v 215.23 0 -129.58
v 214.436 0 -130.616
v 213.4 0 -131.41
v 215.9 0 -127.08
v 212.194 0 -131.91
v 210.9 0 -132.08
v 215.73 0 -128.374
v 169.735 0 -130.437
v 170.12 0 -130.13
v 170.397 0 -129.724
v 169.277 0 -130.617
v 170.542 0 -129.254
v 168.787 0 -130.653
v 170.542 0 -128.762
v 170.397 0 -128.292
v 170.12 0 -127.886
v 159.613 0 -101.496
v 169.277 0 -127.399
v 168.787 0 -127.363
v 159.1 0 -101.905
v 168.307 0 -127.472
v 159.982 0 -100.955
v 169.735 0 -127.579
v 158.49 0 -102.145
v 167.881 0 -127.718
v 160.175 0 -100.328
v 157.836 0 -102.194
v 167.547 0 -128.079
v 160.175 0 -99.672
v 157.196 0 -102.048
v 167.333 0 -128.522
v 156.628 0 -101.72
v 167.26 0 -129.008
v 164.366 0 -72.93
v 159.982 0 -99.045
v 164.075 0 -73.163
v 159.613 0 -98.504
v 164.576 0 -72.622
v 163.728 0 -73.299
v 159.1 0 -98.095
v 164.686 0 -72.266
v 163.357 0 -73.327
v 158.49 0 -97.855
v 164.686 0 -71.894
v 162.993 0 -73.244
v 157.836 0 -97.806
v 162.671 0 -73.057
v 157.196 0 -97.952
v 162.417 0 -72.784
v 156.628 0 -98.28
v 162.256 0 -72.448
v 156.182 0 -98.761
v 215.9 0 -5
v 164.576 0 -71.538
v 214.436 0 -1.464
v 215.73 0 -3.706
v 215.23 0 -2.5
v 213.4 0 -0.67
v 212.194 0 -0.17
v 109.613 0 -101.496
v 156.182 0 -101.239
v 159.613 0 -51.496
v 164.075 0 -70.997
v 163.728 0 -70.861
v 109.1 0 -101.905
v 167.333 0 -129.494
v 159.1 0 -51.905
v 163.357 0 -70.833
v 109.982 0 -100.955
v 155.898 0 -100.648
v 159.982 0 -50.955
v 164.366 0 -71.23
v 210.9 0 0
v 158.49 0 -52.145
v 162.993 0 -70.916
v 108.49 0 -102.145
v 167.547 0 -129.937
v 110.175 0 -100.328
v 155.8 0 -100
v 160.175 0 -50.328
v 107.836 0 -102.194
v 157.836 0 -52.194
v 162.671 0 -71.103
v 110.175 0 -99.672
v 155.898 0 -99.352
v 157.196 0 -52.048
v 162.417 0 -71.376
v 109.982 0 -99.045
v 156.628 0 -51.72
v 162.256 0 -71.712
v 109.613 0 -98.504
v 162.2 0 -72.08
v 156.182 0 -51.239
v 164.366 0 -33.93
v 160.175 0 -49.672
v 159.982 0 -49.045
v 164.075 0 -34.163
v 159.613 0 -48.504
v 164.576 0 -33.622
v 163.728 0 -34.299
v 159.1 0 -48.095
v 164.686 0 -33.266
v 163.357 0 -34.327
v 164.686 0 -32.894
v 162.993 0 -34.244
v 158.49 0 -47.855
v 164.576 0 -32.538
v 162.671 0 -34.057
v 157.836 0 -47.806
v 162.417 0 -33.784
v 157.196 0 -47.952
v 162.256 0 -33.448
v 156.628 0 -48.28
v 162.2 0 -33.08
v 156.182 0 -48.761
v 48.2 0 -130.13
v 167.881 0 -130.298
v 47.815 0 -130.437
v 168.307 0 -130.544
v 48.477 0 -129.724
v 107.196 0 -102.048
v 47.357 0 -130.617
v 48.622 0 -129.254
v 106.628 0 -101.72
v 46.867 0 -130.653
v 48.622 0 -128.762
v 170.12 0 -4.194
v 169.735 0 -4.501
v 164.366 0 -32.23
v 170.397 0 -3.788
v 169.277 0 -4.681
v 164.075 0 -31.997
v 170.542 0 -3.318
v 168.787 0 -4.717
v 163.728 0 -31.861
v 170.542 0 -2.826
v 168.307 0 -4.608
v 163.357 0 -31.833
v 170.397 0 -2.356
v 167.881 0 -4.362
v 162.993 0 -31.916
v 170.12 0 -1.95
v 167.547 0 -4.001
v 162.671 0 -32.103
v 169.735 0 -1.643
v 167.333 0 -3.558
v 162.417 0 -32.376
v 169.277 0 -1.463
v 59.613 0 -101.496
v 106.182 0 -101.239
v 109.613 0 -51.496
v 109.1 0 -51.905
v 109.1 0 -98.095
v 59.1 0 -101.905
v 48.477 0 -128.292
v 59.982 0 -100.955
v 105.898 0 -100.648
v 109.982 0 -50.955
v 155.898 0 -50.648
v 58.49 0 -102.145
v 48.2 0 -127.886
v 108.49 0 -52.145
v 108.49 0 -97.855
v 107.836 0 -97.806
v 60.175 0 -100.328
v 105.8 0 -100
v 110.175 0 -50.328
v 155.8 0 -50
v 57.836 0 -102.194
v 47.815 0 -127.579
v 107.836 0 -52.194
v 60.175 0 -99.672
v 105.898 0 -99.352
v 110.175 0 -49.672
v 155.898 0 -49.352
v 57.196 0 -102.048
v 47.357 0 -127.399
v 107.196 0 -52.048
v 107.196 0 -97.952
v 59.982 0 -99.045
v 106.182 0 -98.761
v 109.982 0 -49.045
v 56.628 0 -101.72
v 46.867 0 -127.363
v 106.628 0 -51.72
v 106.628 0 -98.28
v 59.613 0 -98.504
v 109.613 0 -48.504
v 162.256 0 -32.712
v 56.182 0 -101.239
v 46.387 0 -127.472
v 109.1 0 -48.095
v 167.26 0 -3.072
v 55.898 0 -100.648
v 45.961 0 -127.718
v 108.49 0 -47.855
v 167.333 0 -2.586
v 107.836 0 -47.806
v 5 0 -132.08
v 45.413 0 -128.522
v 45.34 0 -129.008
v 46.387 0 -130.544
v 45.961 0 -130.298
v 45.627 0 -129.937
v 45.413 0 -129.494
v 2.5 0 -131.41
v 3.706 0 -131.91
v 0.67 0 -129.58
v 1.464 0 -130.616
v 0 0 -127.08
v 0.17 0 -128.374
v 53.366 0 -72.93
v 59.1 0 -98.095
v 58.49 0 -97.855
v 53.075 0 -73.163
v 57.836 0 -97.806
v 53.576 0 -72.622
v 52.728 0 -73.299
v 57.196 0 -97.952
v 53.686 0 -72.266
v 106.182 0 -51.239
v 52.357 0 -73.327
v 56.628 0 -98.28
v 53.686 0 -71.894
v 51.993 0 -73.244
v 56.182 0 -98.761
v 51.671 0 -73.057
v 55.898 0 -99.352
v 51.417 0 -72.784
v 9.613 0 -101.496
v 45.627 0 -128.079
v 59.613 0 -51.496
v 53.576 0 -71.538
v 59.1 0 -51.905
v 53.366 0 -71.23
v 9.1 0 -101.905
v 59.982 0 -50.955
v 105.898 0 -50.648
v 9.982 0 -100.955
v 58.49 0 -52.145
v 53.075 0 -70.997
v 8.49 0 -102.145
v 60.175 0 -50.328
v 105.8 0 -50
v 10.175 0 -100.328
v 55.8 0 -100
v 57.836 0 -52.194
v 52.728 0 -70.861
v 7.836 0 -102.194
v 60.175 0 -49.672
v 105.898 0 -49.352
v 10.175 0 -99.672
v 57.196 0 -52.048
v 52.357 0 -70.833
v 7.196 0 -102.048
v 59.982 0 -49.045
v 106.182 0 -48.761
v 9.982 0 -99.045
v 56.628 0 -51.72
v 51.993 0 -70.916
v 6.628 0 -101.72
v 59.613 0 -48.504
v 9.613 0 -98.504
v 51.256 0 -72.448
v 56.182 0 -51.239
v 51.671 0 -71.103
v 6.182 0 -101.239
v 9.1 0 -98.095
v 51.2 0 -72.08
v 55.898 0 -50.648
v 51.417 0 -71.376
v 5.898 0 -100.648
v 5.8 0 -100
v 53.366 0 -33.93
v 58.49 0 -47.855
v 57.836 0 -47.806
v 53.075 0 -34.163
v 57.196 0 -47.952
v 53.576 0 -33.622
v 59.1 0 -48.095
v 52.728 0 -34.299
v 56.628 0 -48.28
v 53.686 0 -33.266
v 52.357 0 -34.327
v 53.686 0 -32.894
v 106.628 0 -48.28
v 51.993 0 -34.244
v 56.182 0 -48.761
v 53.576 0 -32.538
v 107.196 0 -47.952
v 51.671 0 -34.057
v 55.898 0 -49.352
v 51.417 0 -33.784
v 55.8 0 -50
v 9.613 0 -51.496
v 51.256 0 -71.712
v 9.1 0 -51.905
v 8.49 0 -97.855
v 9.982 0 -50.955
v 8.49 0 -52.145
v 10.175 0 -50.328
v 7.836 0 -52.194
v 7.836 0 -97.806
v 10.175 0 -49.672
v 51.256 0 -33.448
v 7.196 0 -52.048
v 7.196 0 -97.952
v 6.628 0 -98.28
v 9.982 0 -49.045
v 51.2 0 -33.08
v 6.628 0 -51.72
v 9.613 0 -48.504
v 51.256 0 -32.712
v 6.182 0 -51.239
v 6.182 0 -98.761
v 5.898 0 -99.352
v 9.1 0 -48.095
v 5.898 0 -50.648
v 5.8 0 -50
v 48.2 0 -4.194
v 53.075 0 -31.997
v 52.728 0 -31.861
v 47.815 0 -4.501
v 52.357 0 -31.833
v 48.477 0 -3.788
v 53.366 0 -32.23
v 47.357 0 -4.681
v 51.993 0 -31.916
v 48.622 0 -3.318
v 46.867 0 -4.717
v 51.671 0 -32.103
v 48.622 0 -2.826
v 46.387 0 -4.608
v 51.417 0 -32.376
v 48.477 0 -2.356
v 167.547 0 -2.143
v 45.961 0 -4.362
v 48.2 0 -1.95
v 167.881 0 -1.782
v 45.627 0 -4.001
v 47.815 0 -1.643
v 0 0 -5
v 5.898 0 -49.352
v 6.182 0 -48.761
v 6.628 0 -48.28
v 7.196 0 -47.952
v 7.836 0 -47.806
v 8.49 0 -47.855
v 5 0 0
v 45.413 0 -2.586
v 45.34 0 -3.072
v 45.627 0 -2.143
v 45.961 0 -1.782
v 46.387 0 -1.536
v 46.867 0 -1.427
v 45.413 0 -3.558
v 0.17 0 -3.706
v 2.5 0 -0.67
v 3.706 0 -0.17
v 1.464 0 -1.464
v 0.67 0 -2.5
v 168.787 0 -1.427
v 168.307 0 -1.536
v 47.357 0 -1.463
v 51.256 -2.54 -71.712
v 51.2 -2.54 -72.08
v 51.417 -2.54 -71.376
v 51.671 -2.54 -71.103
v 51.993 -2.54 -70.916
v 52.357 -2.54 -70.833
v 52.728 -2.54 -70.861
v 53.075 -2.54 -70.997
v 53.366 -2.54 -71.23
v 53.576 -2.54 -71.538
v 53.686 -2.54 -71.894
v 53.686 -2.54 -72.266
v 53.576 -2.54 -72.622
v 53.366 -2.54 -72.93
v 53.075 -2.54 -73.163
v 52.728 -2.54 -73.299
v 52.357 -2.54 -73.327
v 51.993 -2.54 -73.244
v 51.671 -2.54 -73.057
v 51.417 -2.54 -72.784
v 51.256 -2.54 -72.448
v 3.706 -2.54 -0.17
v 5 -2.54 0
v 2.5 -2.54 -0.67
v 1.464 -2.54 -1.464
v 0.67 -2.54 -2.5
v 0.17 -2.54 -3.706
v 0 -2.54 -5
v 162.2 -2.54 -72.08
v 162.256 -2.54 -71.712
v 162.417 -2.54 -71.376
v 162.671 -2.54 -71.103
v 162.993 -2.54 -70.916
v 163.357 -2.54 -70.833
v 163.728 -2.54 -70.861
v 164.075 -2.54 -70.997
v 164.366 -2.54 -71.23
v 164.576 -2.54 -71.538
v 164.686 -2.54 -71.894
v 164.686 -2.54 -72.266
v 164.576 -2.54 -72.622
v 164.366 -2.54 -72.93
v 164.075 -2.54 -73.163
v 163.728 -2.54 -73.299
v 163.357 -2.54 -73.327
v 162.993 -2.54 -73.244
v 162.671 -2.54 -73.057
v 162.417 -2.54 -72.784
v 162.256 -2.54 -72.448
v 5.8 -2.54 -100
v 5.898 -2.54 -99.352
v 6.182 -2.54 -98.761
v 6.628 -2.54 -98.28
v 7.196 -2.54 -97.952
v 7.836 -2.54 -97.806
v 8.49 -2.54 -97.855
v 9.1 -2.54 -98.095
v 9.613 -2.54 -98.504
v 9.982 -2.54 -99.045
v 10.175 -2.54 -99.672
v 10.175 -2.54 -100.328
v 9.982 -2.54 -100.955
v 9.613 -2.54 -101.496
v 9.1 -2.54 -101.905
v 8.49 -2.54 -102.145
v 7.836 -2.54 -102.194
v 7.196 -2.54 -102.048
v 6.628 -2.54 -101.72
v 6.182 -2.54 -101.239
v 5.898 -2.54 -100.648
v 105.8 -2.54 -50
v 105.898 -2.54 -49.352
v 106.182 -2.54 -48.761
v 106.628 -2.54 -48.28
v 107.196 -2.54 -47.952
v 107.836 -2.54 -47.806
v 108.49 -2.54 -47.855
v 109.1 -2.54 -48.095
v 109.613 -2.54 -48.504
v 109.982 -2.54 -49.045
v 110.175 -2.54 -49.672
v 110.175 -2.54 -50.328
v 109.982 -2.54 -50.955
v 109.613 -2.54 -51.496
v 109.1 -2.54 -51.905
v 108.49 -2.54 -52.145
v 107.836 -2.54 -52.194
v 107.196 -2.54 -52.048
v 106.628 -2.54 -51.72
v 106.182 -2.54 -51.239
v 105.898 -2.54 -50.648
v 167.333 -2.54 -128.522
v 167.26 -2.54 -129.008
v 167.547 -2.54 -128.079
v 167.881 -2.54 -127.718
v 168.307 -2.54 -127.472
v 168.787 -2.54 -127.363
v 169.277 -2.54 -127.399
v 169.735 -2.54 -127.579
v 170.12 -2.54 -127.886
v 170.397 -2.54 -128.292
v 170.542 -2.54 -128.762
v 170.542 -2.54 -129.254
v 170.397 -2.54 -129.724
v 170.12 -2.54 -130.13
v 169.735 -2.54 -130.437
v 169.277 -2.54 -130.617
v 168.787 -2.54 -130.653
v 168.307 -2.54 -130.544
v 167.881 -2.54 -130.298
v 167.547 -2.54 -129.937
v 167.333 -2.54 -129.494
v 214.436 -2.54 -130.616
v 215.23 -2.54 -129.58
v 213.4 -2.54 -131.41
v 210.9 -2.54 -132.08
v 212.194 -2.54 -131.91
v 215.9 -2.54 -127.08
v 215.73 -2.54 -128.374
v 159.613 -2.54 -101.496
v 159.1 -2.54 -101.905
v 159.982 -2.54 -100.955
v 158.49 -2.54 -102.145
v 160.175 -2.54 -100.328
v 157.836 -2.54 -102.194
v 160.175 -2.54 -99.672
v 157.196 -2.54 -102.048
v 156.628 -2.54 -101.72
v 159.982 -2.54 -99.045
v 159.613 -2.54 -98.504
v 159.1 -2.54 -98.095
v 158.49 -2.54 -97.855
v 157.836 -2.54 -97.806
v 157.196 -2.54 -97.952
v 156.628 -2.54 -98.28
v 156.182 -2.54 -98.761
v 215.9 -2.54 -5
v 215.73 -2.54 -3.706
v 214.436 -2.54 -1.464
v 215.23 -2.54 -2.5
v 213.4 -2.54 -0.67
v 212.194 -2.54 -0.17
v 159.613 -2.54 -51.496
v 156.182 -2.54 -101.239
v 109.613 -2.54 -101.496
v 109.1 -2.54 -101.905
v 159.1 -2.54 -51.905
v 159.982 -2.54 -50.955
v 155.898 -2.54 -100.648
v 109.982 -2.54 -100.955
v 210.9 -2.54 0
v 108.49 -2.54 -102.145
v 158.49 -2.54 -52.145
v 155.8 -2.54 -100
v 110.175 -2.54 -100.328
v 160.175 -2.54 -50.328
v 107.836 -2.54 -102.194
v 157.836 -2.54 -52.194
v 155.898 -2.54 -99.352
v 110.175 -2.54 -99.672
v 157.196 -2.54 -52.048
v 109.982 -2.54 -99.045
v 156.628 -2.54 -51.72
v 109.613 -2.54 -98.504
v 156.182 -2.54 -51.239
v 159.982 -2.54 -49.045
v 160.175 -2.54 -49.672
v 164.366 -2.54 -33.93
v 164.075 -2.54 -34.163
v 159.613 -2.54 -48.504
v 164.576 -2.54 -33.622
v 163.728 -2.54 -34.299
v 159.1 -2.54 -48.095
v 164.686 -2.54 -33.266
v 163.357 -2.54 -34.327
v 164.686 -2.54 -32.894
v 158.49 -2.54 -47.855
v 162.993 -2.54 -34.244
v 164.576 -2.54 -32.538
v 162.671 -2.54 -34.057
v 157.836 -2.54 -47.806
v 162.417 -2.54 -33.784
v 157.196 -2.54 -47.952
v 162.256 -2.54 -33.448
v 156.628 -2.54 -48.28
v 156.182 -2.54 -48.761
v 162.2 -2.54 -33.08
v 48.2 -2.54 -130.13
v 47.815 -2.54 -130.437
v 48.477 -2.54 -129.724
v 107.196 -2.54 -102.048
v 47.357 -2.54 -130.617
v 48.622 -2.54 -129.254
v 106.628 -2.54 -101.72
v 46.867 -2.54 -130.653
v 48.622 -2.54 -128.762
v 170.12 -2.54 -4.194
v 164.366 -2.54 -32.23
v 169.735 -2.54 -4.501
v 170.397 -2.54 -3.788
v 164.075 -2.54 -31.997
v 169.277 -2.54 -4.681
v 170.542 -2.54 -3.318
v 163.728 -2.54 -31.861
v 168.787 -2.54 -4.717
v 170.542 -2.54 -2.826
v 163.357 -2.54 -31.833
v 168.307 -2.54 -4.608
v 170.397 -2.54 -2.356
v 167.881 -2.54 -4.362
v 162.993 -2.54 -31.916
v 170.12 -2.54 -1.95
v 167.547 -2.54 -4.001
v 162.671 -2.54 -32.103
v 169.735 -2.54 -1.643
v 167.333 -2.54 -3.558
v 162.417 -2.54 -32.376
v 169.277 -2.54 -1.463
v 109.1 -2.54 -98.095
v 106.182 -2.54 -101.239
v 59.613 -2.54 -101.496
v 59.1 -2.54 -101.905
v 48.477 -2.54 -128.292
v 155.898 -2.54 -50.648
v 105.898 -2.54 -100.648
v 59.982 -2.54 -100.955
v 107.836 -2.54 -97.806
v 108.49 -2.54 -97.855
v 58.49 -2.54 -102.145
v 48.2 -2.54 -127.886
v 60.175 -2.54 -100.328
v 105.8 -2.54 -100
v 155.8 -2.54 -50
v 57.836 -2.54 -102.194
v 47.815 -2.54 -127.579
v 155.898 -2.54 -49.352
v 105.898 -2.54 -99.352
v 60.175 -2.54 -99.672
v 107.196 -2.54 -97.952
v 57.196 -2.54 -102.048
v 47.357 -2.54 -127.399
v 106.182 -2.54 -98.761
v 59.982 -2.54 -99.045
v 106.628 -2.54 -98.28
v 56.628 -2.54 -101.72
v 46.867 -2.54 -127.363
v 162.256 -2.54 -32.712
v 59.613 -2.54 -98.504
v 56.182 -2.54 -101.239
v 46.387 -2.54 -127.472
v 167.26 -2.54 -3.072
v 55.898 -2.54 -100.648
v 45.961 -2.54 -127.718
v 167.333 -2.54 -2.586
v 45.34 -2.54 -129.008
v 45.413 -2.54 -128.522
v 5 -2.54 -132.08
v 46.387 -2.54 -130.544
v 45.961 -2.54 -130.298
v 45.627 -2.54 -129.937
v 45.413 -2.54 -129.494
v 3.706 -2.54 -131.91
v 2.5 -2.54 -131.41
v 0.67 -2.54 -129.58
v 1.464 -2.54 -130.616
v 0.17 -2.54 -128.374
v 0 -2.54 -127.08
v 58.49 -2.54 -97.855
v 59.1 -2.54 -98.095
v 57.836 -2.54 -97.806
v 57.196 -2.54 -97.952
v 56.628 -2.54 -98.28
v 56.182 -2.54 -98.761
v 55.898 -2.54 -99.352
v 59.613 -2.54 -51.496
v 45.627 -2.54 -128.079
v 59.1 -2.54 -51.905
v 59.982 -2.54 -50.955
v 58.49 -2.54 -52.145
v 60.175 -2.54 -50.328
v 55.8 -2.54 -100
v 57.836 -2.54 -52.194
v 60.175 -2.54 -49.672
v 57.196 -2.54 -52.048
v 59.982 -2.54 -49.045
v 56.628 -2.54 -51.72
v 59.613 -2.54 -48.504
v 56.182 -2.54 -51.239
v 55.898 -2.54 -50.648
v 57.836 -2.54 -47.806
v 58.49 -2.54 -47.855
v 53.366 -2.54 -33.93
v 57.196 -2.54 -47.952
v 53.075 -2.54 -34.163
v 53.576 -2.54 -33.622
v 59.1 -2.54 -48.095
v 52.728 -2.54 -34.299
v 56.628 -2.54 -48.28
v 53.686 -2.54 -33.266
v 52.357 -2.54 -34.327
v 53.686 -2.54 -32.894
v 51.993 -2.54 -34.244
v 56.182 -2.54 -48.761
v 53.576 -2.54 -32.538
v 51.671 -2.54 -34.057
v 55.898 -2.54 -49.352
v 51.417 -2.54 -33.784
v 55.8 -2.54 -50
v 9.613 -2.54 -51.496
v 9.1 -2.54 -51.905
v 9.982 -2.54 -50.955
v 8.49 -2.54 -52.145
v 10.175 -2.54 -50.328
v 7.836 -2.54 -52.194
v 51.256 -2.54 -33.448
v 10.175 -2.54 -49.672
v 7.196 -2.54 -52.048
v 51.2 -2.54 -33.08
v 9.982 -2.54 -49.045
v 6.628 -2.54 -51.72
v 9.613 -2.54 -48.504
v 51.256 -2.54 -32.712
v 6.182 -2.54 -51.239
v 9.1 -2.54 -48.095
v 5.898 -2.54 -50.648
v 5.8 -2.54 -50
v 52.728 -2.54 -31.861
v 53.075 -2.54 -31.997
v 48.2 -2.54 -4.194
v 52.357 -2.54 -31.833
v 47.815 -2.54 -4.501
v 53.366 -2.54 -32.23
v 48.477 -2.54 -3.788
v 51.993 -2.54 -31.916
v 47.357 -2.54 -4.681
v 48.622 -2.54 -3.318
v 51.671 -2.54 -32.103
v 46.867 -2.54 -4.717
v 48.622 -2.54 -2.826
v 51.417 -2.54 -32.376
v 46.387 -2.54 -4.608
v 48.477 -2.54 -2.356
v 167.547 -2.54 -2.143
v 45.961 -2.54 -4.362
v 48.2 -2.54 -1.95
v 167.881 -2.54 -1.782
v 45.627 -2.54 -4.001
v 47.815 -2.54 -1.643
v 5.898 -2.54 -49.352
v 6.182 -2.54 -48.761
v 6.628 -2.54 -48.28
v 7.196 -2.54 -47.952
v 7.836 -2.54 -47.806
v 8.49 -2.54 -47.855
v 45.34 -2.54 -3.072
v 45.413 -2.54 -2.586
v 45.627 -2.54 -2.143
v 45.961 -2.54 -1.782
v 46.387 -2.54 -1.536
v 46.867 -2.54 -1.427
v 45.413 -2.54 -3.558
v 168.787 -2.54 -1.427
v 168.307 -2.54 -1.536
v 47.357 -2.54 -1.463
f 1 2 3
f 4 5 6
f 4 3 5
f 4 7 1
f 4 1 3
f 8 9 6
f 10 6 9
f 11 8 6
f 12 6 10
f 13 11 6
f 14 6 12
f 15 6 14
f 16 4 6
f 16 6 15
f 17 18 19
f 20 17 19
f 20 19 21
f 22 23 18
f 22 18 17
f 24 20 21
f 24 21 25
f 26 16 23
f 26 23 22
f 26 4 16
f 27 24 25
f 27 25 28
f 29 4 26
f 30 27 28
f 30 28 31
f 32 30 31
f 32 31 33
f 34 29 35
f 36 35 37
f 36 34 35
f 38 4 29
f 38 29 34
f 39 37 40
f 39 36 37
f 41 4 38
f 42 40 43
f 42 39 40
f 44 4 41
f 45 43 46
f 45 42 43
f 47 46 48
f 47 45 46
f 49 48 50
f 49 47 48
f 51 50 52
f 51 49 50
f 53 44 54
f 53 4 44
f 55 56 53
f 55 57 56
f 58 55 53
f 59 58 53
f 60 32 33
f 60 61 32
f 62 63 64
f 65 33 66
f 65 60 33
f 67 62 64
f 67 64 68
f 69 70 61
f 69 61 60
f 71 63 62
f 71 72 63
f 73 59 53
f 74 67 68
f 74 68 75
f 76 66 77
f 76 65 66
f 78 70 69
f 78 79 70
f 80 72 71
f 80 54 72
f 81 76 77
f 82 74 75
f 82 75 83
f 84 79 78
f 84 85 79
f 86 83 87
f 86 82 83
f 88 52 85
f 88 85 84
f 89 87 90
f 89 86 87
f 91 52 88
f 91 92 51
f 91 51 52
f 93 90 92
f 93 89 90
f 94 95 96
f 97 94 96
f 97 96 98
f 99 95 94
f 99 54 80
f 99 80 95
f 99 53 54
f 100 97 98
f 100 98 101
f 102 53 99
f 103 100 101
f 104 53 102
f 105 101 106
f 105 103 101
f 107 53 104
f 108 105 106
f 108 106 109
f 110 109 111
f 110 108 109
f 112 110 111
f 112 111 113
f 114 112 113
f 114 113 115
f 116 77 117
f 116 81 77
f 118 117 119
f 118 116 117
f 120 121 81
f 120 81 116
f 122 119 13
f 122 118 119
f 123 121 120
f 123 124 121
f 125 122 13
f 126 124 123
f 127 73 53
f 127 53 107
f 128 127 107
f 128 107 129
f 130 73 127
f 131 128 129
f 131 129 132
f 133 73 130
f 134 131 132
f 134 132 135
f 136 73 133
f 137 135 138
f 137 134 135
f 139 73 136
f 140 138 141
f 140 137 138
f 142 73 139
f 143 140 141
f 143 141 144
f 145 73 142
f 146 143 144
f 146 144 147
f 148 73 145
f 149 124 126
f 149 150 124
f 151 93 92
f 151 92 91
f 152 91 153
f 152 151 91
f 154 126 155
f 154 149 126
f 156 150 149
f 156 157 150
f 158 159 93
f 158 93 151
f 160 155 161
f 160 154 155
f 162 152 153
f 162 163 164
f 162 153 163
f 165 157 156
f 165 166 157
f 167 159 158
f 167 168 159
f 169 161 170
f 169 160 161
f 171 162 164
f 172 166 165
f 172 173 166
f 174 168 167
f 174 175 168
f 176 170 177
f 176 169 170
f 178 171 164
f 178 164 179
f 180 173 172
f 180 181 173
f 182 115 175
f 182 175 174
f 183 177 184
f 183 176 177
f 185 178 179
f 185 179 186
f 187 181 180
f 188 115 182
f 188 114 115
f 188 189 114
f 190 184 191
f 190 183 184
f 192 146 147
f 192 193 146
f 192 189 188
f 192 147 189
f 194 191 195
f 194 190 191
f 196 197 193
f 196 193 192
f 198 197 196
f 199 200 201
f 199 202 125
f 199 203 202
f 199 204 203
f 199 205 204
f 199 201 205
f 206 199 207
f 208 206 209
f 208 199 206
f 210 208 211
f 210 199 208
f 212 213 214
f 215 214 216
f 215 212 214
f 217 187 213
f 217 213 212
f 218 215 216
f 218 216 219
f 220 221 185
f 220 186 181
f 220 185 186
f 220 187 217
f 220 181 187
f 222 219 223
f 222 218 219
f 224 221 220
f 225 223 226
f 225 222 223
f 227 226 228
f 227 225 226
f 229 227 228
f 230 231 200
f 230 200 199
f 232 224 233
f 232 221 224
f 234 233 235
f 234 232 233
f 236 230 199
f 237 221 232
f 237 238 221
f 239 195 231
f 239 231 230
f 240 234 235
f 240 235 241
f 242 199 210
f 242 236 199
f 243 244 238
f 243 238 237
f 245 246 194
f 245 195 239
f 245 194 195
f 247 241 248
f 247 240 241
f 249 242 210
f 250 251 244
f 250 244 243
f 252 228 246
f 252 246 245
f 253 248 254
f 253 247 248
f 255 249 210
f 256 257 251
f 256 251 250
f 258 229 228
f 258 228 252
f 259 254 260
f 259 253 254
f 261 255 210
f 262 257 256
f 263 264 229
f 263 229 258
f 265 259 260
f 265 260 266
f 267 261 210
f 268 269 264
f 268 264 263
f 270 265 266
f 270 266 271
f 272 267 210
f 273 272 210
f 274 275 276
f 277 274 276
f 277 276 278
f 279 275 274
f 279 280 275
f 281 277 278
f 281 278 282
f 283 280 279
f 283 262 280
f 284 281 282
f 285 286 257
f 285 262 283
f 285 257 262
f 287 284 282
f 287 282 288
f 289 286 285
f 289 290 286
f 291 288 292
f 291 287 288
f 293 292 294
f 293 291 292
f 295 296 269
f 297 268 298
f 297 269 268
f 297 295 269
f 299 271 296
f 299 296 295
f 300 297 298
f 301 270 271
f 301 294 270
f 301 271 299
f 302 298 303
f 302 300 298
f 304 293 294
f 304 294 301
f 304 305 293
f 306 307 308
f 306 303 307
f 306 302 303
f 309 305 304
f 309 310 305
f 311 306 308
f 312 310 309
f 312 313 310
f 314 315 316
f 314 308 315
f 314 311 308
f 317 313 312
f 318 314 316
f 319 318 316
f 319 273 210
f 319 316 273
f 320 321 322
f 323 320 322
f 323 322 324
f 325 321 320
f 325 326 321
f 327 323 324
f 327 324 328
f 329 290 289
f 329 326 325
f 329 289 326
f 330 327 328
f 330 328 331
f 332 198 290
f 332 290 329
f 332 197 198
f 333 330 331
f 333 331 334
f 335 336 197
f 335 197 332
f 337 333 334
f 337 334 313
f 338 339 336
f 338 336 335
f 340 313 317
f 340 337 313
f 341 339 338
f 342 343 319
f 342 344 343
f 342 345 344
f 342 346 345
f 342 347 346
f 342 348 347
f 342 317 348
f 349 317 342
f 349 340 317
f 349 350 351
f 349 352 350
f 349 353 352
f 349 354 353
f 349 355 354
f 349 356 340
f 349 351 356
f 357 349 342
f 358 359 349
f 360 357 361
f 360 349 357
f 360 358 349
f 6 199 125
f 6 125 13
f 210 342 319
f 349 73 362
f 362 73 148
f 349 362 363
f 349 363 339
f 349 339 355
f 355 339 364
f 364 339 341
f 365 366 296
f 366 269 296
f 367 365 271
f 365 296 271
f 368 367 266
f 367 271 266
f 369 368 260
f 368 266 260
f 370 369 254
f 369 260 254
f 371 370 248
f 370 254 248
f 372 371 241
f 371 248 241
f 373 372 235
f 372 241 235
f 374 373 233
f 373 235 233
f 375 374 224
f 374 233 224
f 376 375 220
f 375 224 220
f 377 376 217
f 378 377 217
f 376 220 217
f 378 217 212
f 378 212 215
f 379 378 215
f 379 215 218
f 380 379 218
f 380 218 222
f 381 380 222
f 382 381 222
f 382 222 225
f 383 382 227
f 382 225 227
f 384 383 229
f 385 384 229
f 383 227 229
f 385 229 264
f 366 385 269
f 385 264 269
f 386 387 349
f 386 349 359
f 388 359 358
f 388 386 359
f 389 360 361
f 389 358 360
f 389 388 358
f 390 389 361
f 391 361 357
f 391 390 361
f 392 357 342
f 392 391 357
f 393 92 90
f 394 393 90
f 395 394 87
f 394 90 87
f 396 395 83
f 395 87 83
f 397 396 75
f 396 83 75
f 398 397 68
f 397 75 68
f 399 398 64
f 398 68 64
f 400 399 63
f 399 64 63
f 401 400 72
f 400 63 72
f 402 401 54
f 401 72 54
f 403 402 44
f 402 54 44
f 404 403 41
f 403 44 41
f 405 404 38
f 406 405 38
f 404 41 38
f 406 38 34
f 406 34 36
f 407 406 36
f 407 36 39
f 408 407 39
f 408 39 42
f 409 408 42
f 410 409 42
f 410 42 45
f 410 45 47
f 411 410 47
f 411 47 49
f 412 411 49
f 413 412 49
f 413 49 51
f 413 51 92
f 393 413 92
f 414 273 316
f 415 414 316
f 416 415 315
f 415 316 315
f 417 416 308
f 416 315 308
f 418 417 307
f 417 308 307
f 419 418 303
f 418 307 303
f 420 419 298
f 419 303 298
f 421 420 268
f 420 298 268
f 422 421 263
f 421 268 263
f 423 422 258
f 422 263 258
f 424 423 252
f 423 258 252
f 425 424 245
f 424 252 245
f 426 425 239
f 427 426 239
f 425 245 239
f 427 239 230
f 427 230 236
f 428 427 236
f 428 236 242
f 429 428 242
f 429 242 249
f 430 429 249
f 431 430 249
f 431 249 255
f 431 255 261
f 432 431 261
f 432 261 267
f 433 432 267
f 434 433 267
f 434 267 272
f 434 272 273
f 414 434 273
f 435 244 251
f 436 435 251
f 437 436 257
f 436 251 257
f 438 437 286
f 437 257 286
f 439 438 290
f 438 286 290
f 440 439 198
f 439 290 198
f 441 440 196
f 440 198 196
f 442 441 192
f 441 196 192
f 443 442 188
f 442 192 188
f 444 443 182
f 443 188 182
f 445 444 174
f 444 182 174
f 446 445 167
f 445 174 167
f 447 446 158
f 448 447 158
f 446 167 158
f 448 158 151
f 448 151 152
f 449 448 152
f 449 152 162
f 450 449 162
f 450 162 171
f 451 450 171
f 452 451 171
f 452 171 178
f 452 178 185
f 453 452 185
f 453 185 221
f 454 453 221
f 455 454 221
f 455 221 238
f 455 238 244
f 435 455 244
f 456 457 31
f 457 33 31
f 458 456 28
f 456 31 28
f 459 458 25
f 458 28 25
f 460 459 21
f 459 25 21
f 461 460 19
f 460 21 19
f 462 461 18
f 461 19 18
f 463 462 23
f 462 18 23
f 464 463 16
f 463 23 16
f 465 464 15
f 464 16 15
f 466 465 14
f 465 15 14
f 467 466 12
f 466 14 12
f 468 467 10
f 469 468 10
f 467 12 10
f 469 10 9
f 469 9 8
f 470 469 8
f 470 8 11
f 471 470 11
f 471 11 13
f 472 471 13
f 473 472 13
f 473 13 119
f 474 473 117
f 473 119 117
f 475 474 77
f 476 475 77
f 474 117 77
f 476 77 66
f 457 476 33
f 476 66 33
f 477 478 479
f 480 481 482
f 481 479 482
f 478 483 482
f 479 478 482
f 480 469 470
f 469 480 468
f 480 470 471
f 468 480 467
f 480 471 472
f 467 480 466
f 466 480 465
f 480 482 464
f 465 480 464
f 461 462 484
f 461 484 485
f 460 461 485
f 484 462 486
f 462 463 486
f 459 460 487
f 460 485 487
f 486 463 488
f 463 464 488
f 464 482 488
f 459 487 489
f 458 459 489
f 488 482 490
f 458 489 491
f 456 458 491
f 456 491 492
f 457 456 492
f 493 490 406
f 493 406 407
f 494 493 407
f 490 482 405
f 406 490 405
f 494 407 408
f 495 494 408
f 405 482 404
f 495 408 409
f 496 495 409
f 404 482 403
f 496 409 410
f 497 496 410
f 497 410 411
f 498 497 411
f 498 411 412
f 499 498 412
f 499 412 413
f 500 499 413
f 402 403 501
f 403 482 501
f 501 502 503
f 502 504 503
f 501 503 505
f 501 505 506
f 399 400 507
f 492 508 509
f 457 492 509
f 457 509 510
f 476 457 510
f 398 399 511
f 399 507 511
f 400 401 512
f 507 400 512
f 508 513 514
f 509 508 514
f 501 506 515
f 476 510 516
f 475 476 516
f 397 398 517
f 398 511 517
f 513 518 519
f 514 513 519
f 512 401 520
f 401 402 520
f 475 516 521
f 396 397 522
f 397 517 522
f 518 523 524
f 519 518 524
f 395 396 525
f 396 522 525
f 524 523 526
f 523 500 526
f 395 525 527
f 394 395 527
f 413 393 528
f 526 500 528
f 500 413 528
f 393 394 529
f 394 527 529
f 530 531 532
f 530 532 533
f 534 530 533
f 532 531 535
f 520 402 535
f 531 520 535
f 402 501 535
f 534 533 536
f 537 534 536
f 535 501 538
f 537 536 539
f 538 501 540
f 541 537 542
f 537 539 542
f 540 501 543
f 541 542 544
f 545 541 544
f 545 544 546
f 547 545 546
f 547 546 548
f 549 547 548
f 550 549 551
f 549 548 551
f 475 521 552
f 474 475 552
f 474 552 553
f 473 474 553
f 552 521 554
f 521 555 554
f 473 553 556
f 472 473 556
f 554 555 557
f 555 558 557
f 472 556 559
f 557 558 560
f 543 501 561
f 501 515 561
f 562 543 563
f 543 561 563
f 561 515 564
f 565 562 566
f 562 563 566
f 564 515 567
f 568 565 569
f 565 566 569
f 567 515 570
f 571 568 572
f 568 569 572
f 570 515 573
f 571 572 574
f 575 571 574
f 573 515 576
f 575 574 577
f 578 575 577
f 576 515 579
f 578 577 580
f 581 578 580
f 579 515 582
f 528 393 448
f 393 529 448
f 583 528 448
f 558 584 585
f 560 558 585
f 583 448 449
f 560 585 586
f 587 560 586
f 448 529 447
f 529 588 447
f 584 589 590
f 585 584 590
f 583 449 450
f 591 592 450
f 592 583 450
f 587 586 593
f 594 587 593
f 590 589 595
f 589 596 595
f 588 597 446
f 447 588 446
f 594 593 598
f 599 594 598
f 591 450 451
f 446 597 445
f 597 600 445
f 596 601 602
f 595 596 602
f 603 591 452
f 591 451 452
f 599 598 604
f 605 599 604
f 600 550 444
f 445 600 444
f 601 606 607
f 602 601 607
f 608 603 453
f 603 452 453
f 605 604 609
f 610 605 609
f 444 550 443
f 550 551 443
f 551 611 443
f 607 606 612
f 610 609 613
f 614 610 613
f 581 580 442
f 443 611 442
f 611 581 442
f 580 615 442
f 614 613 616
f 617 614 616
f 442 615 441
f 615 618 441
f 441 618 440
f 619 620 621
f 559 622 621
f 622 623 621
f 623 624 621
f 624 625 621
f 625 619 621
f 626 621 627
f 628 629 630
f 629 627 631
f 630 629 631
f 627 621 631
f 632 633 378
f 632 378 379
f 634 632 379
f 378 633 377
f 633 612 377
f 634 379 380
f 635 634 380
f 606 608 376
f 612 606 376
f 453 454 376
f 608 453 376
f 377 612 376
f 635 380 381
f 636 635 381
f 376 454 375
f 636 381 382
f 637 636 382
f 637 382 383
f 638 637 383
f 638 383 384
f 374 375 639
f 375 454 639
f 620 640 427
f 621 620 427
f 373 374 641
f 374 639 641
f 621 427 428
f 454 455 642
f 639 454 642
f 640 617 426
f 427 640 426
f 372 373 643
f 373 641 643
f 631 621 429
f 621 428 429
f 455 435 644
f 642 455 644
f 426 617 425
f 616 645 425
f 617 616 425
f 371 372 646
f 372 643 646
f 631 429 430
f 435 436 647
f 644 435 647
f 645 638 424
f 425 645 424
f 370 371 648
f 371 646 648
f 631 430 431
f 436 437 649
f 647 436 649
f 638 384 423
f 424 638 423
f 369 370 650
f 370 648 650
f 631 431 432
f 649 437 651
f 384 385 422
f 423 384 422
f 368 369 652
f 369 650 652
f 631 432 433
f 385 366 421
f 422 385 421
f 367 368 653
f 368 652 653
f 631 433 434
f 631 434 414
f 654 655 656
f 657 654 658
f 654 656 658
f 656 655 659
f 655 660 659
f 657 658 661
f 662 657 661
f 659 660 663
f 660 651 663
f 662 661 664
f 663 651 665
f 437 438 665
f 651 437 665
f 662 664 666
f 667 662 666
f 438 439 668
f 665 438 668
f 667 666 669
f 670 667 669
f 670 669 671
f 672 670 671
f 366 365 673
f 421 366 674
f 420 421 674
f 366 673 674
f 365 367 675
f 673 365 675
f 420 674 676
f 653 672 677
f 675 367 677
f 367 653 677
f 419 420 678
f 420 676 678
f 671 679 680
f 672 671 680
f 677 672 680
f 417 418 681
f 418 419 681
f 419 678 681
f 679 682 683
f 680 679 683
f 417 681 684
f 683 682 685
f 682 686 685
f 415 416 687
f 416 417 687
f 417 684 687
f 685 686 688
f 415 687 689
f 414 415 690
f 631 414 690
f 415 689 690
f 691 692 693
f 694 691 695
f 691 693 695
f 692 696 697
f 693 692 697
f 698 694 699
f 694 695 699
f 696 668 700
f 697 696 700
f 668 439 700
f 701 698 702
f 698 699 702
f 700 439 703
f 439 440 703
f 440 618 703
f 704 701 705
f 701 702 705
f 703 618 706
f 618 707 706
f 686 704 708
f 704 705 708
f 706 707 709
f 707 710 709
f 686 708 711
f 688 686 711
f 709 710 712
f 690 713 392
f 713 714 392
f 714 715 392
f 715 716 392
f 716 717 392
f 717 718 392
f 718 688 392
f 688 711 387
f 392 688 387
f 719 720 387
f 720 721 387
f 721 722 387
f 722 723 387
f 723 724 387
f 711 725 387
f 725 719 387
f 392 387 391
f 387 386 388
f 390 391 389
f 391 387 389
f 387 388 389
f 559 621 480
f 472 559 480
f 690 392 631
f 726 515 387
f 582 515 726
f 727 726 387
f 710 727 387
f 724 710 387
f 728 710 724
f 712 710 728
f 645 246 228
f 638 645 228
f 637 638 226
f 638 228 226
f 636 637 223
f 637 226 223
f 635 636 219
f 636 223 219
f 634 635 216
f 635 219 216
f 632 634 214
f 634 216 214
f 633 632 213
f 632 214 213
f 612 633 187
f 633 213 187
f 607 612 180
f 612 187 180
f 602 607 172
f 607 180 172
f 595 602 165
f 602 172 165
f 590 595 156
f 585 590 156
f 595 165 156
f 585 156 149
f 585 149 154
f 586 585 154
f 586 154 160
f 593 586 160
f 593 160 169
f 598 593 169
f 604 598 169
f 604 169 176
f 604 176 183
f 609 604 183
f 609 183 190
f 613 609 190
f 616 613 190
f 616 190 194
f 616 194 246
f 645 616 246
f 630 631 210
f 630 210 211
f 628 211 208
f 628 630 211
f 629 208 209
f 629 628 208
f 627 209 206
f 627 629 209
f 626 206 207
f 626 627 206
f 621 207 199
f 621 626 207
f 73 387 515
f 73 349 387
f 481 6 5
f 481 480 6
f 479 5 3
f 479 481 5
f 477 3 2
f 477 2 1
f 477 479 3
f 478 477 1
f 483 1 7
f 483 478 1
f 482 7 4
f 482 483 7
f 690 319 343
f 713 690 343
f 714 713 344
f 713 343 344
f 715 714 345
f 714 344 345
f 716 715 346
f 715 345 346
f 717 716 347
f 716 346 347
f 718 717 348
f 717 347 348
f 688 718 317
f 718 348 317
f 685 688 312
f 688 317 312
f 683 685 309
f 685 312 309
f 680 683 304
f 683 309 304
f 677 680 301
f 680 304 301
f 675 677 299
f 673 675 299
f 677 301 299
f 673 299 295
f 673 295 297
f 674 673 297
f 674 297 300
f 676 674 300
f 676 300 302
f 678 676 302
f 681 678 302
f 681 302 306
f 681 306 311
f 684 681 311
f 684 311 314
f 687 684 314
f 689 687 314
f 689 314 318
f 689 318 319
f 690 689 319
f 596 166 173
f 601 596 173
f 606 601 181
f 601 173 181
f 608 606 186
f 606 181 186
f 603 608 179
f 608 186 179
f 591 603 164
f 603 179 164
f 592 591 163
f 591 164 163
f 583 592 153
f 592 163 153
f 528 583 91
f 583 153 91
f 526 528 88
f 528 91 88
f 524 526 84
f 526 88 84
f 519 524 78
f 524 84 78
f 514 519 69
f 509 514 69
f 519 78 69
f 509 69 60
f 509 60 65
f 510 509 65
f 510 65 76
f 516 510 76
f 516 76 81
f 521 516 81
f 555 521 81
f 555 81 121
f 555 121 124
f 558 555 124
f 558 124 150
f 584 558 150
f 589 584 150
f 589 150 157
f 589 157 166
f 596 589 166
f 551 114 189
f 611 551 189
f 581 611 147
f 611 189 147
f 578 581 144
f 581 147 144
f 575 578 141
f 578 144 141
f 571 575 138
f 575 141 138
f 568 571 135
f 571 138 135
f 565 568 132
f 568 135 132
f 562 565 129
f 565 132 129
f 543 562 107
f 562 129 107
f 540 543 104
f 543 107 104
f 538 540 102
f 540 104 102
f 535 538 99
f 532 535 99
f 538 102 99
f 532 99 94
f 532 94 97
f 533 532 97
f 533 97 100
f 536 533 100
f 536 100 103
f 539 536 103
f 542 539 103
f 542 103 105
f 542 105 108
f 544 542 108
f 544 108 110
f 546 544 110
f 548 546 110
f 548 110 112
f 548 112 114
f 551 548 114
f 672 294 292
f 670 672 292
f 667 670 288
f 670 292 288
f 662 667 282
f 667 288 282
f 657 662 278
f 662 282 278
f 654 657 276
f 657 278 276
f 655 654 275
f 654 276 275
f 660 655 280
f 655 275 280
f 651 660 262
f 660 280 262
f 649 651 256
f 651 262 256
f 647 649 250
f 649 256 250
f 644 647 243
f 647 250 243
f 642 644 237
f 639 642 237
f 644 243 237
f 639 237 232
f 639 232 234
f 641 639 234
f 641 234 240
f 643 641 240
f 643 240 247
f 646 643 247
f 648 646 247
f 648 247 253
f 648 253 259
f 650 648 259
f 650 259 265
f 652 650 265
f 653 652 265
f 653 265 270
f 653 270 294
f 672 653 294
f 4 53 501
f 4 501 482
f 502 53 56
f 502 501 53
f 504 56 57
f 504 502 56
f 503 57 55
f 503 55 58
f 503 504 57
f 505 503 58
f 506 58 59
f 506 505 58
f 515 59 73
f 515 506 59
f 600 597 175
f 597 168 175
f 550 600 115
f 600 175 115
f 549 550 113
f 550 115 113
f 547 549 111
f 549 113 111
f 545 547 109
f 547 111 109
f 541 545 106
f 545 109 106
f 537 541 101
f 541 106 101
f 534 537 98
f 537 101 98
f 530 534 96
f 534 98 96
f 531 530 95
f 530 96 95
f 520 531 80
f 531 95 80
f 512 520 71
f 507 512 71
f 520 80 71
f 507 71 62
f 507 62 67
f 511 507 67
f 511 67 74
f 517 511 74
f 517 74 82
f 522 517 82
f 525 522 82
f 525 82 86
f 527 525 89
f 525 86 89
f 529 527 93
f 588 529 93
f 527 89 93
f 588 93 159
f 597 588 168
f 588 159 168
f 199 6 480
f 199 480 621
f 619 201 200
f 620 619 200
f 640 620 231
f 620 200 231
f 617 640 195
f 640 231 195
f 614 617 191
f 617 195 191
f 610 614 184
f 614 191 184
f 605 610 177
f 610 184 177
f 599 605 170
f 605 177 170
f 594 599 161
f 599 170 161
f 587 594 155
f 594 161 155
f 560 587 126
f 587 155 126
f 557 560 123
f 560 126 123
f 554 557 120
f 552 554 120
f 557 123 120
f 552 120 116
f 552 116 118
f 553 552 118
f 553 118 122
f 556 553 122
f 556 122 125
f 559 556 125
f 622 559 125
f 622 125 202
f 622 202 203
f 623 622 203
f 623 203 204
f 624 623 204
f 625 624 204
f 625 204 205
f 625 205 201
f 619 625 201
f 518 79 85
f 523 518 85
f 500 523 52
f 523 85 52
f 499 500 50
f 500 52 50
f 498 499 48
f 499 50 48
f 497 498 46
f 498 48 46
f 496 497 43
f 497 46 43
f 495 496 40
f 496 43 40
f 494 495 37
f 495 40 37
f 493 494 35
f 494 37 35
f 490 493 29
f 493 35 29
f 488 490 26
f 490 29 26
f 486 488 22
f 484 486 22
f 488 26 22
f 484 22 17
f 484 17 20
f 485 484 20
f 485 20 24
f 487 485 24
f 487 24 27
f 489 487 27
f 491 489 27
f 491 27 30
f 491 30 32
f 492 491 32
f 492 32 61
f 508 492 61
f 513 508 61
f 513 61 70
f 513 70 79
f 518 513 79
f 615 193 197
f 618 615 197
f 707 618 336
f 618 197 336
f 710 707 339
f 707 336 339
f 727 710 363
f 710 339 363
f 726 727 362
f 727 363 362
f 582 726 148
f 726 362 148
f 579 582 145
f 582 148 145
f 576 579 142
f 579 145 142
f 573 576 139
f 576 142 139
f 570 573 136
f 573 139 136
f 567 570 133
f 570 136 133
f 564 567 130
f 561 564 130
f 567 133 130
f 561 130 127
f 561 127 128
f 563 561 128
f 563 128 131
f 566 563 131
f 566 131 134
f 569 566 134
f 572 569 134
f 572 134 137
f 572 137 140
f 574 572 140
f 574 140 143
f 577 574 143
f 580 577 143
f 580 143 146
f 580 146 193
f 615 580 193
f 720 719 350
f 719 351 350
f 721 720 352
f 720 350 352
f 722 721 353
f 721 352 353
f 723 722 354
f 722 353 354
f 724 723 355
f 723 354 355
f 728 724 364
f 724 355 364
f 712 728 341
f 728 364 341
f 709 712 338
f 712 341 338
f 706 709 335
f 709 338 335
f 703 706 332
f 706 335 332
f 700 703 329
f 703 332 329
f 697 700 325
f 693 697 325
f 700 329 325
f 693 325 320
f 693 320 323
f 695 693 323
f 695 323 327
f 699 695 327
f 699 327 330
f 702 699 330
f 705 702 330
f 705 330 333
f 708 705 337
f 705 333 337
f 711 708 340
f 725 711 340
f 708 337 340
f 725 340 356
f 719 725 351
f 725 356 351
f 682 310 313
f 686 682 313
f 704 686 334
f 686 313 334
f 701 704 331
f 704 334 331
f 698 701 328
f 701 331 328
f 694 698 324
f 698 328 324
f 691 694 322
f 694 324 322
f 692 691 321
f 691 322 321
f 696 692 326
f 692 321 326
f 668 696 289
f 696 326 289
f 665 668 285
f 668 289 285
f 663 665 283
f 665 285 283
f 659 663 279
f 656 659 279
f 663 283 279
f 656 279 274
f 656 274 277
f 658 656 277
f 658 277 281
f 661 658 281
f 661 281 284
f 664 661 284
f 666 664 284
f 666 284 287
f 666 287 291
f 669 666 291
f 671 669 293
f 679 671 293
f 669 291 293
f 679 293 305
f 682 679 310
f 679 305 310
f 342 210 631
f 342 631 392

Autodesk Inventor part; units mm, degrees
ref_plane "YZ Plane" through (0, 0, 0) normal (1, 0, 0) x (0, 1, 0)
ref_plane "XZ Plane" through (0, 0, 0) normal (0, 1, 0) x (-1, 0, 0)
ref_plane "XY Plane" through (0, 0, 0) normal (0, 0, 1) x (1, 0, 0)
sketch "Sketch1" plane through (0, 0, 0) normal (0, 1, 0) x (-1, 0, 0)
  line L0 (0, 0) -> (-215.9, 0)
  line L1 (-215.9, 0) -> (-215.9, -132.08)
  line L2 (-215.9, -132.08) -> (0, -132.08)
  line L3 (0, -132.08) -> (0, 0)
  circle A0 centre (-46.99, -129.008) radius 1.65
  circle A1 centre (-168.91, -129.008) radius 1.65
  circle A2 centre (-46.99, -3.072) radius 1.65
  circle A3 centre (-168.91, -3.072) radius 1.65
  circle A4 centre (-8, -50) radius 2.2
  circle A5 centre (-8, -100) radius 2.2
  circle A6 centre (-58, -50) radius 2.2
  circle A7 centre (-58, -100) radius 2.2
  circle A8 centre (-108, -50) radius 2.2
  circle A9 centre (-108, -100) radius 2.2
  circle A10 centre (-158, -50) radius 2.2
  circle A11 centre (-158, -100) radius 2.2
  circle A12 centre (-52.45, -72.08) radius 1.25
  circle A13 centre (-163.45, -72.08) radius 1.25
  circle A14 centre (-52.45, -33.08) radius 1.25
  circle A15 centre (-163.45, -33.08) radius 1.25
  dimension "d0" = 215.9
  dimension "d1" = 132.08
  dimension "d2" = 3.3
  dimension "d5" = 121.92
  dimension "d8" = 125.936
  dimension "d11" = 46.99
  dimension "d12" = 3.072
  dimension "d13" = 3.072
  dimension "d14" = 4.4
  dimension "d15" = 50
  dimension "d16" = 8
  dimension "d19" = 50
  dimension "d22" = 50
  dimension "d30" = 2.5
  dimension "d33" = 111
  dimension "d36" = 39
  dimension "d39" = 60
  dimension "d40" = 52.45
extrude "Extrusion1" add sketch "Sketch1" against normal blind 2.54
sketch "Sketch2" plane through (0, 0, 0) normal (0, 1, 0) x (1, 0, 0)
  line L0 (108.9107, 44.2653) -> (116.6369, 44.2653) construction
  line L1 (116.6369, 44.2653) -> (116.6369, 41.0888) construction
  line L2 (116.6369, 41.0888) -> (108.9107, 41.0888) construction
  line L3 (108.9107, 41.0888) -> (108.9107, 44.2653) construction
  point P0 (0, 0)
extrude "Extrusion2" [suppressed]
fillet "Fillet1" radius 5 4 edges at (0, -1.27, 0) (215.9, -1.27, 0) (215.9, -1.27, -132.08) (0, -1.27, -132.08)
sketch "Sketch3" plane through (0, 0, 0) normal (0, 1, 0) x (1, 0, 0)
  arc A0 (5, 132.08) -> (0, 127.08) centre (5, 127.08) ccw projected
  line L0 (0, 127.08) -> (0, 5) projected
  arc A1 (0, 5) -> (5, 0) centre (5, 5) ccw projected
  line L1 (5, 0) -> (210.9, 0) projected
  arc A2 (210.9, 0) -> (215.9, 5) centre (210.9, 5) ccw projected
  line L2 (215.9, 5) -> (215.9, 127.08) projected
  arc A3 (215.9, 127.08) -> (210.9, 132.08) centre (210.9, 127.08) ccw projected
  line L3 (210.9, 132.08) -> (5, 132.08) projected
  circle A4 centre (163.45, 33.08) radius 1.25 projected
  circle A5 centre (163.45, 72.08) radius 1.25 projected
  circle A6 centre (158, 100) radius 2.2 projected
  circle A7 centre (108, 100) radius 2.2 projected
  circle A8 centre (58, 100) radius 2.2 projected
  circle A9 centre (58, 50) radius 2.2 projected
  circle A10 centre (8, 100) radius 2.2 projected
  circle A11 centre (8, 50) radius 2.2 projected
  circle A12 centre (168.91, 3.072) radius 1.65 projected
  circle A13 centre (46.99, 3.072) radius 1.65 projected
  circle A14 centre (168.91, 129.008) radius 1.65 projected
  circle A15 centre (46.99, 129.008) radius 1.65 projected
  circle A16 centre (108, 50) radius 2.2 projected
  circle A17 centre (158, 50) radius 2.2 projected
  circle A18 centre (52.45, 72.08) radius 1.25 projected
  circle A19 centre (52.45, 33.08) radius 1.25 projected
  point P0 (0, 0)
equation "\"d40\" = -0.5 * d33 + 0.5 * d0"
properties part number "amplifier_tray"
